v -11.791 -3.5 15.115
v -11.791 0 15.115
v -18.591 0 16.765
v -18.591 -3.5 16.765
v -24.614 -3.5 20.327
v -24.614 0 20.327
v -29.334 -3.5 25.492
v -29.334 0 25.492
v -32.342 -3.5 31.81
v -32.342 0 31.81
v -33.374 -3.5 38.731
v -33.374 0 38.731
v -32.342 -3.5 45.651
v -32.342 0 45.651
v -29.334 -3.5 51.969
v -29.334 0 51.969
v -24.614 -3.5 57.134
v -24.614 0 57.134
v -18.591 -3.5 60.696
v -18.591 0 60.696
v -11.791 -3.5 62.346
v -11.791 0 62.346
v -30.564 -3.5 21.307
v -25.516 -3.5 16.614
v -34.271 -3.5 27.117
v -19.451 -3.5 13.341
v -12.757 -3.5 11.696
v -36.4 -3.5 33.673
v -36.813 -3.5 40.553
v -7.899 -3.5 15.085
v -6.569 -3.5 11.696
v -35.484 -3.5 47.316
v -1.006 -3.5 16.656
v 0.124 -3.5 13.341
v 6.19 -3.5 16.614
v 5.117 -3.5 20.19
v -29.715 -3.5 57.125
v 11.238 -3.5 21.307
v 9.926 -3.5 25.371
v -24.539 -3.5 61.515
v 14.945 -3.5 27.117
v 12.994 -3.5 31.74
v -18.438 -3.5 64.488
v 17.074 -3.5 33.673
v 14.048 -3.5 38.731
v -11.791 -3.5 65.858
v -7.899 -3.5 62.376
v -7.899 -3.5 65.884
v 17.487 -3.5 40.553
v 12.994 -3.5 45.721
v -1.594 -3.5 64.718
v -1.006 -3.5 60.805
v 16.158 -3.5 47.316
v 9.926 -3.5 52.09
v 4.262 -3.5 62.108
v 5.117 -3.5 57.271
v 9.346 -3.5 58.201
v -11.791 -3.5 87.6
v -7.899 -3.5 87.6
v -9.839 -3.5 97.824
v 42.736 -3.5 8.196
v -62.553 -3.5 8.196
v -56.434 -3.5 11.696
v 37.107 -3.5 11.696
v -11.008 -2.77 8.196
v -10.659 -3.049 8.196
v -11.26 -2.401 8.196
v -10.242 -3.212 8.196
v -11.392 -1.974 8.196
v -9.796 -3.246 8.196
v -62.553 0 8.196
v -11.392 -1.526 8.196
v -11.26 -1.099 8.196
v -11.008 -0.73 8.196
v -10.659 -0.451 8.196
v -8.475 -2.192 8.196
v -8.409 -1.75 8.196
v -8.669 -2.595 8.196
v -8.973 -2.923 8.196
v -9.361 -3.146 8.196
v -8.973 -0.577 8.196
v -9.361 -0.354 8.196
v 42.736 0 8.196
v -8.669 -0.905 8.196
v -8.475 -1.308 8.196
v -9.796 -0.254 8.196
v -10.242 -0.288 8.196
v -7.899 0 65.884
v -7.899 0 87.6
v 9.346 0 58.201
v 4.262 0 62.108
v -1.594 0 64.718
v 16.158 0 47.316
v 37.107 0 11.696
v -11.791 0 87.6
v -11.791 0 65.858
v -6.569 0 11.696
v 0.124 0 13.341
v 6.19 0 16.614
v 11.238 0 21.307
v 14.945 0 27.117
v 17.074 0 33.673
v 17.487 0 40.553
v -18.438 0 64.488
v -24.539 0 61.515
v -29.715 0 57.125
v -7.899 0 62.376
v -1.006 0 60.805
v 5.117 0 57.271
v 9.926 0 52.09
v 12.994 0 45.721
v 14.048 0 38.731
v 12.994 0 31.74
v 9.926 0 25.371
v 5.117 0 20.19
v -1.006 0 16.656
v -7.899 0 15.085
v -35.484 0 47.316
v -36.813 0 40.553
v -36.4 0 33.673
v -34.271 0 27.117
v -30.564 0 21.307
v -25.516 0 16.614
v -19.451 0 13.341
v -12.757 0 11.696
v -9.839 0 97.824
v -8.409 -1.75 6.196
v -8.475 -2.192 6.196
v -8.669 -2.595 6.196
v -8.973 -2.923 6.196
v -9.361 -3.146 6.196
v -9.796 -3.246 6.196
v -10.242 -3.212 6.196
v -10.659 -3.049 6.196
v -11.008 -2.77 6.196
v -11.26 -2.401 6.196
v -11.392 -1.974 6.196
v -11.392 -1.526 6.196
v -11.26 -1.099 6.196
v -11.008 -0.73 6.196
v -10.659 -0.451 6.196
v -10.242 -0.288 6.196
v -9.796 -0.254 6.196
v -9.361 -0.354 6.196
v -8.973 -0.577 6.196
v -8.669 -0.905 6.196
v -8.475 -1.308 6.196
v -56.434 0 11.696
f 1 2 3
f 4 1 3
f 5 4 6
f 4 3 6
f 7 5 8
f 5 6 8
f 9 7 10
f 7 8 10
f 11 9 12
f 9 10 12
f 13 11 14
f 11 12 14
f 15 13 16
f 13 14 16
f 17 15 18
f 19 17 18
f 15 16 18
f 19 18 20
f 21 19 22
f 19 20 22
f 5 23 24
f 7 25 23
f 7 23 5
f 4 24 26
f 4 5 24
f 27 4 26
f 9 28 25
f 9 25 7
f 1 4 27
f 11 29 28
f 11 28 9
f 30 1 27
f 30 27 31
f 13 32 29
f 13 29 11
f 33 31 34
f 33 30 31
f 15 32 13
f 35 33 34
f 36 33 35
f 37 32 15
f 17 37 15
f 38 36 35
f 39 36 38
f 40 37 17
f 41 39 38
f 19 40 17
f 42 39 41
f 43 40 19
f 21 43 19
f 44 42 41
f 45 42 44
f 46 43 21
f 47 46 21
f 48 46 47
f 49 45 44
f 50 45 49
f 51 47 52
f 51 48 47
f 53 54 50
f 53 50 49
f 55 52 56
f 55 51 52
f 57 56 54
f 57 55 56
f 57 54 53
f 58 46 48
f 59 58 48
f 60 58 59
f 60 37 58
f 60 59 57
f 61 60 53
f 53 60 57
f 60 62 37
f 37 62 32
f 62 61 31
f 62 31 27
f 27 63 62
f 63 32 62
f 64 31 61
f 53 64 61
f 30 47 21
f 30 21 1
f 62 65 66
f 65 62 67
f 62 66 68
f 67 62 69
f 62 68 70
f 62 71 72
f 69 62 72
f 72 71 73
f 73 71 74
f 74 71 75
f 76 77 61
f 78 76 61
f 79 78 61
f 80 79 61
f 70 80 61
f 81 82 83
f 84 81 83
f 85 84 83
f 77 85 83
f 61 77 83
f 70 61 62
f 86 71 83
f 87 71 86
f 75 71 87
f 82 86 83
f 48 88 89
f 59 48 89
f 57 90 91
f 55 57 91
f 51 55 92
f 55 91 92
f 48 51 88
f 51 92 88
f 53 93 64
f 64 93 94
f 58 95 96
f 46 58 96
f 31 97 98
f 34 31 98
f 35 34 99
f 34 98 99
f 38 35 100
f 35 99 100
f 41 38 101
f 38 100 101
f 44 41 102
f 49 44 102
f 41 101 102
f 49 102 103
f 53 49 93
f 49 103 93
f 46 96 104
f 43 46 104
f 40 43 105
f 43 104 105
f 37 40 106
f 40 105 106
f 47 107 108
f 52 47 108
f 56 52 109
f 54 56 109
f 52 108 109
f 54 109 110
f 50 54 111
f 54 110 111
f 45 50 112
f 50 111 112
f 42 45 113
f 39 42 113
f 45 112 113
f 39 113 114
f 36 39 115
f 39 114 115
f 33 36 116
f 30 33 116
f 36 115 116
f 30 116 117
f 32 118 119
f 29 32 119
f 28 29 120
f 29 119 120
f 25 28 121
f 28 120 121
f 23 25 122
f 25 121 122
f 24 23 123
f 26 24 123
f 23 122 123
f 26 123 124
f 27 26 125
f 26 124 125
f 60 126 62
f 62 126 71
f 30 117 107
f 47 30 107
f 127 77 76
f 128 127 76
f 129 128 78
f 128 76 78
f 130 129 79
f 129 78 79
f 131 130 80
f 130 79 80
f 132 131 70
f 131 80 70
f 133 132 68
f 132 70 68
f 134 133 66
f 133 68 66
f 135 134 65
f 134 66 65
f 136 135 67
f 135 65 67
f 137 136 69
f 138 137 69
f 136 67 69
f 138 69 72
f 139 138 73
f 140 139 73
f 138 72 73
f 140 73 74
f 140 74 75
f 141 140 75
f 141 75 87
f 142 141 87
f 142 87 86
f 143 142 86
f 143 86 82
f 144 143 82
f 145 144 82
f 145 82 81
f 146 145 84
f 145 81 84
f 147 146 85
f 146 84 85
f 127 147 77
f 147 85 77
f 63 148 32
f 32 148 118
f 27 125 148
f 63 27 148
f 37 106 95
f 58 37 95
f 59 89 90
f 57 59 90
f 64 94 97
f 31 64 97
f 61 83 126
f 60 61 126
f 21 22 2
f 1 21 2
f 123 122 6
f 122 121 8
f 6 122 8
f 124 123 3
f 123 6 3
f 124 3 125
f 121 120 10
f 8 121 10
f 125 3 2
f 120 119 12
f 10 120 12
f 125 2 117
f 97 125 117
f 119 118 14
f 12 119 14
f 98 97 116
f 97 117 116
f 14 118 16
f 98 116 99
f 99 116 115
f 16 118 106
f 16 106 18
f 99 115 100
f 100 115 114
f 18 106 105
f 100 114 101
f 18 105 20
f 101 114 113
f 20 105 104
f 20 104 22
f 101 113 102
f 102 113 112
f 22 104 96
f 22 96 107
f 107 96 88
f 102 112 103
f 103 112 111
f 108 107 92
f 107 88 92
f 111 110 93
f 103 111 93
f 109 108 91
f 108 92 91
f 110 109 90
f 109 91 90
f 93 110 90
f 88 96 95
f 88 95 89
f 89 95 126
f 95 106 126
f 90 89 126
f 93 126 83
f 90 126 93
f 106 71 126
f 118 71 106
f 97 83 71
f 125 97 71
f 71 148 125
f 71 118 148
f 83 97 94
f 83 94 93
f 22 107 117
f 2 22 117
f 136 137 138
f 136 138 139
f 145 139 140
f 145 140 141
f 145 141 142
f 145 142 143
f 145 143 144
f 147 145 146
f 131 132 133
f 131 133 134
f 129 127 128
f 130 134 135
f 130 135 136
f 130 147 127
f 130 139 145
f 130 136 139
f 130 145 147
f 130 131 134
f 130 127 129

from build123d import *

# Parameters (mm, degrees)
F1_DEPTH = 3.5
F2_R     = 1.5
F3_DEPTH = 2


# Not quite as in the source:
# - a feature names something its author has since deleted; it is built from what else it names


with BuildPart() as f1:
    # F0 (on Front) → F1 (new body)
    with BuildSketch(Plane.XZ):
        Polygon((42.7356177972, 8.1960540903), (-9.8386000647, 97.8239037067), (-62.5526416078, 8.1960540903), align=None)
        with BuildLine():
            Line((-12.7572676559, 11.6960540903), (-56.4336672666, 11.6960540903))
            Line((-56.4336672666, 11.6960540903), (-35.4842691453, 47.3155863706))
            ThreePointArc((-35.4842691453, 47.3155863706), (-32.6024132797, 24.0941164977), (-12.7572676559, 11.6960540903))
        make_face(mode=Mode.SUBTRACT)
        with BuildLine():
            ThreePointArc((-11.7914030425, 15.1152742164), (-33.3740588193, 38.7305133045), (-11.7914030425, 62.3457523925))
            Line((-11.7914030425, 62.3457523925), (-11.7914030425, 15.1152742164))
        make_face(mode=Mode.SUBTRACT)
        with BuildLine():
            ThreePointArc((-6.5689498166, 11.6960540903), (13.2761958072, 24.0941164977), (16.1580516728, 47.3155863706))
            Line((16.1580516728, 47.3155863706), (37.1074497941, 11.6960540903))
            Line((37.1074497941, 11.6960540903), (-6.5689498166, 11.6960540903))
        make_face(mode=Mode.SUBTRACT)
        with BuildLine():
            ThreePointArc((-7.8989818992, 62.3757456007), (14.0478413468, 38.7305133045), (-7.8989818992, 15.0852810082))
            Line((-7.8989818992, 15.0852810082), (-7.8989818992, 62.3757456007))
        make_face(mode=Mode.SUBTRACT)
        with BuildLine():
            Line((-29.7147789735, 57.1252496473), (-11.7914030425, 87.5997417472))
            Line((-11.7914030425, 87.5997417472), (-11.7914030425, 65.8581038309))
            ThreePointArc((-11.7914030425, 65.8581038309), (-21.5817241061, 63.1923695727), (-29.7147789735, 57.1252496473))
        make_face(mode=Mode.SUBTRACT)
        with BuildLine():
            Line((-7.8989818992, 65.8842176728), (-7.8989818992, 87.5997417472))
            Line((-7.8989818992, 87.5997417472), (9.3459755849, 58.2007602904))
            ThreePointArc((9.3459755849, 58.2007602904), (1.4112063573, 63.5860026304), (-7.8989818992, 65.8842176728))
        make_face(mode=Mode.SUBTRACT)
    extrude(amount=F1_DEPTH)

    # F2 (on face) → F3 (join)
    with BuildSketch(Plane(origin=(0, 0, 8.1960540903), x_dir=(1, 0, 0), z_dir=(0, 0, -1))):
        with Locations((-9.9085119053, 1.75)):
            Circle(F2_R)
    extrude(amount=F3_DEPTH)


solid = f1.part
